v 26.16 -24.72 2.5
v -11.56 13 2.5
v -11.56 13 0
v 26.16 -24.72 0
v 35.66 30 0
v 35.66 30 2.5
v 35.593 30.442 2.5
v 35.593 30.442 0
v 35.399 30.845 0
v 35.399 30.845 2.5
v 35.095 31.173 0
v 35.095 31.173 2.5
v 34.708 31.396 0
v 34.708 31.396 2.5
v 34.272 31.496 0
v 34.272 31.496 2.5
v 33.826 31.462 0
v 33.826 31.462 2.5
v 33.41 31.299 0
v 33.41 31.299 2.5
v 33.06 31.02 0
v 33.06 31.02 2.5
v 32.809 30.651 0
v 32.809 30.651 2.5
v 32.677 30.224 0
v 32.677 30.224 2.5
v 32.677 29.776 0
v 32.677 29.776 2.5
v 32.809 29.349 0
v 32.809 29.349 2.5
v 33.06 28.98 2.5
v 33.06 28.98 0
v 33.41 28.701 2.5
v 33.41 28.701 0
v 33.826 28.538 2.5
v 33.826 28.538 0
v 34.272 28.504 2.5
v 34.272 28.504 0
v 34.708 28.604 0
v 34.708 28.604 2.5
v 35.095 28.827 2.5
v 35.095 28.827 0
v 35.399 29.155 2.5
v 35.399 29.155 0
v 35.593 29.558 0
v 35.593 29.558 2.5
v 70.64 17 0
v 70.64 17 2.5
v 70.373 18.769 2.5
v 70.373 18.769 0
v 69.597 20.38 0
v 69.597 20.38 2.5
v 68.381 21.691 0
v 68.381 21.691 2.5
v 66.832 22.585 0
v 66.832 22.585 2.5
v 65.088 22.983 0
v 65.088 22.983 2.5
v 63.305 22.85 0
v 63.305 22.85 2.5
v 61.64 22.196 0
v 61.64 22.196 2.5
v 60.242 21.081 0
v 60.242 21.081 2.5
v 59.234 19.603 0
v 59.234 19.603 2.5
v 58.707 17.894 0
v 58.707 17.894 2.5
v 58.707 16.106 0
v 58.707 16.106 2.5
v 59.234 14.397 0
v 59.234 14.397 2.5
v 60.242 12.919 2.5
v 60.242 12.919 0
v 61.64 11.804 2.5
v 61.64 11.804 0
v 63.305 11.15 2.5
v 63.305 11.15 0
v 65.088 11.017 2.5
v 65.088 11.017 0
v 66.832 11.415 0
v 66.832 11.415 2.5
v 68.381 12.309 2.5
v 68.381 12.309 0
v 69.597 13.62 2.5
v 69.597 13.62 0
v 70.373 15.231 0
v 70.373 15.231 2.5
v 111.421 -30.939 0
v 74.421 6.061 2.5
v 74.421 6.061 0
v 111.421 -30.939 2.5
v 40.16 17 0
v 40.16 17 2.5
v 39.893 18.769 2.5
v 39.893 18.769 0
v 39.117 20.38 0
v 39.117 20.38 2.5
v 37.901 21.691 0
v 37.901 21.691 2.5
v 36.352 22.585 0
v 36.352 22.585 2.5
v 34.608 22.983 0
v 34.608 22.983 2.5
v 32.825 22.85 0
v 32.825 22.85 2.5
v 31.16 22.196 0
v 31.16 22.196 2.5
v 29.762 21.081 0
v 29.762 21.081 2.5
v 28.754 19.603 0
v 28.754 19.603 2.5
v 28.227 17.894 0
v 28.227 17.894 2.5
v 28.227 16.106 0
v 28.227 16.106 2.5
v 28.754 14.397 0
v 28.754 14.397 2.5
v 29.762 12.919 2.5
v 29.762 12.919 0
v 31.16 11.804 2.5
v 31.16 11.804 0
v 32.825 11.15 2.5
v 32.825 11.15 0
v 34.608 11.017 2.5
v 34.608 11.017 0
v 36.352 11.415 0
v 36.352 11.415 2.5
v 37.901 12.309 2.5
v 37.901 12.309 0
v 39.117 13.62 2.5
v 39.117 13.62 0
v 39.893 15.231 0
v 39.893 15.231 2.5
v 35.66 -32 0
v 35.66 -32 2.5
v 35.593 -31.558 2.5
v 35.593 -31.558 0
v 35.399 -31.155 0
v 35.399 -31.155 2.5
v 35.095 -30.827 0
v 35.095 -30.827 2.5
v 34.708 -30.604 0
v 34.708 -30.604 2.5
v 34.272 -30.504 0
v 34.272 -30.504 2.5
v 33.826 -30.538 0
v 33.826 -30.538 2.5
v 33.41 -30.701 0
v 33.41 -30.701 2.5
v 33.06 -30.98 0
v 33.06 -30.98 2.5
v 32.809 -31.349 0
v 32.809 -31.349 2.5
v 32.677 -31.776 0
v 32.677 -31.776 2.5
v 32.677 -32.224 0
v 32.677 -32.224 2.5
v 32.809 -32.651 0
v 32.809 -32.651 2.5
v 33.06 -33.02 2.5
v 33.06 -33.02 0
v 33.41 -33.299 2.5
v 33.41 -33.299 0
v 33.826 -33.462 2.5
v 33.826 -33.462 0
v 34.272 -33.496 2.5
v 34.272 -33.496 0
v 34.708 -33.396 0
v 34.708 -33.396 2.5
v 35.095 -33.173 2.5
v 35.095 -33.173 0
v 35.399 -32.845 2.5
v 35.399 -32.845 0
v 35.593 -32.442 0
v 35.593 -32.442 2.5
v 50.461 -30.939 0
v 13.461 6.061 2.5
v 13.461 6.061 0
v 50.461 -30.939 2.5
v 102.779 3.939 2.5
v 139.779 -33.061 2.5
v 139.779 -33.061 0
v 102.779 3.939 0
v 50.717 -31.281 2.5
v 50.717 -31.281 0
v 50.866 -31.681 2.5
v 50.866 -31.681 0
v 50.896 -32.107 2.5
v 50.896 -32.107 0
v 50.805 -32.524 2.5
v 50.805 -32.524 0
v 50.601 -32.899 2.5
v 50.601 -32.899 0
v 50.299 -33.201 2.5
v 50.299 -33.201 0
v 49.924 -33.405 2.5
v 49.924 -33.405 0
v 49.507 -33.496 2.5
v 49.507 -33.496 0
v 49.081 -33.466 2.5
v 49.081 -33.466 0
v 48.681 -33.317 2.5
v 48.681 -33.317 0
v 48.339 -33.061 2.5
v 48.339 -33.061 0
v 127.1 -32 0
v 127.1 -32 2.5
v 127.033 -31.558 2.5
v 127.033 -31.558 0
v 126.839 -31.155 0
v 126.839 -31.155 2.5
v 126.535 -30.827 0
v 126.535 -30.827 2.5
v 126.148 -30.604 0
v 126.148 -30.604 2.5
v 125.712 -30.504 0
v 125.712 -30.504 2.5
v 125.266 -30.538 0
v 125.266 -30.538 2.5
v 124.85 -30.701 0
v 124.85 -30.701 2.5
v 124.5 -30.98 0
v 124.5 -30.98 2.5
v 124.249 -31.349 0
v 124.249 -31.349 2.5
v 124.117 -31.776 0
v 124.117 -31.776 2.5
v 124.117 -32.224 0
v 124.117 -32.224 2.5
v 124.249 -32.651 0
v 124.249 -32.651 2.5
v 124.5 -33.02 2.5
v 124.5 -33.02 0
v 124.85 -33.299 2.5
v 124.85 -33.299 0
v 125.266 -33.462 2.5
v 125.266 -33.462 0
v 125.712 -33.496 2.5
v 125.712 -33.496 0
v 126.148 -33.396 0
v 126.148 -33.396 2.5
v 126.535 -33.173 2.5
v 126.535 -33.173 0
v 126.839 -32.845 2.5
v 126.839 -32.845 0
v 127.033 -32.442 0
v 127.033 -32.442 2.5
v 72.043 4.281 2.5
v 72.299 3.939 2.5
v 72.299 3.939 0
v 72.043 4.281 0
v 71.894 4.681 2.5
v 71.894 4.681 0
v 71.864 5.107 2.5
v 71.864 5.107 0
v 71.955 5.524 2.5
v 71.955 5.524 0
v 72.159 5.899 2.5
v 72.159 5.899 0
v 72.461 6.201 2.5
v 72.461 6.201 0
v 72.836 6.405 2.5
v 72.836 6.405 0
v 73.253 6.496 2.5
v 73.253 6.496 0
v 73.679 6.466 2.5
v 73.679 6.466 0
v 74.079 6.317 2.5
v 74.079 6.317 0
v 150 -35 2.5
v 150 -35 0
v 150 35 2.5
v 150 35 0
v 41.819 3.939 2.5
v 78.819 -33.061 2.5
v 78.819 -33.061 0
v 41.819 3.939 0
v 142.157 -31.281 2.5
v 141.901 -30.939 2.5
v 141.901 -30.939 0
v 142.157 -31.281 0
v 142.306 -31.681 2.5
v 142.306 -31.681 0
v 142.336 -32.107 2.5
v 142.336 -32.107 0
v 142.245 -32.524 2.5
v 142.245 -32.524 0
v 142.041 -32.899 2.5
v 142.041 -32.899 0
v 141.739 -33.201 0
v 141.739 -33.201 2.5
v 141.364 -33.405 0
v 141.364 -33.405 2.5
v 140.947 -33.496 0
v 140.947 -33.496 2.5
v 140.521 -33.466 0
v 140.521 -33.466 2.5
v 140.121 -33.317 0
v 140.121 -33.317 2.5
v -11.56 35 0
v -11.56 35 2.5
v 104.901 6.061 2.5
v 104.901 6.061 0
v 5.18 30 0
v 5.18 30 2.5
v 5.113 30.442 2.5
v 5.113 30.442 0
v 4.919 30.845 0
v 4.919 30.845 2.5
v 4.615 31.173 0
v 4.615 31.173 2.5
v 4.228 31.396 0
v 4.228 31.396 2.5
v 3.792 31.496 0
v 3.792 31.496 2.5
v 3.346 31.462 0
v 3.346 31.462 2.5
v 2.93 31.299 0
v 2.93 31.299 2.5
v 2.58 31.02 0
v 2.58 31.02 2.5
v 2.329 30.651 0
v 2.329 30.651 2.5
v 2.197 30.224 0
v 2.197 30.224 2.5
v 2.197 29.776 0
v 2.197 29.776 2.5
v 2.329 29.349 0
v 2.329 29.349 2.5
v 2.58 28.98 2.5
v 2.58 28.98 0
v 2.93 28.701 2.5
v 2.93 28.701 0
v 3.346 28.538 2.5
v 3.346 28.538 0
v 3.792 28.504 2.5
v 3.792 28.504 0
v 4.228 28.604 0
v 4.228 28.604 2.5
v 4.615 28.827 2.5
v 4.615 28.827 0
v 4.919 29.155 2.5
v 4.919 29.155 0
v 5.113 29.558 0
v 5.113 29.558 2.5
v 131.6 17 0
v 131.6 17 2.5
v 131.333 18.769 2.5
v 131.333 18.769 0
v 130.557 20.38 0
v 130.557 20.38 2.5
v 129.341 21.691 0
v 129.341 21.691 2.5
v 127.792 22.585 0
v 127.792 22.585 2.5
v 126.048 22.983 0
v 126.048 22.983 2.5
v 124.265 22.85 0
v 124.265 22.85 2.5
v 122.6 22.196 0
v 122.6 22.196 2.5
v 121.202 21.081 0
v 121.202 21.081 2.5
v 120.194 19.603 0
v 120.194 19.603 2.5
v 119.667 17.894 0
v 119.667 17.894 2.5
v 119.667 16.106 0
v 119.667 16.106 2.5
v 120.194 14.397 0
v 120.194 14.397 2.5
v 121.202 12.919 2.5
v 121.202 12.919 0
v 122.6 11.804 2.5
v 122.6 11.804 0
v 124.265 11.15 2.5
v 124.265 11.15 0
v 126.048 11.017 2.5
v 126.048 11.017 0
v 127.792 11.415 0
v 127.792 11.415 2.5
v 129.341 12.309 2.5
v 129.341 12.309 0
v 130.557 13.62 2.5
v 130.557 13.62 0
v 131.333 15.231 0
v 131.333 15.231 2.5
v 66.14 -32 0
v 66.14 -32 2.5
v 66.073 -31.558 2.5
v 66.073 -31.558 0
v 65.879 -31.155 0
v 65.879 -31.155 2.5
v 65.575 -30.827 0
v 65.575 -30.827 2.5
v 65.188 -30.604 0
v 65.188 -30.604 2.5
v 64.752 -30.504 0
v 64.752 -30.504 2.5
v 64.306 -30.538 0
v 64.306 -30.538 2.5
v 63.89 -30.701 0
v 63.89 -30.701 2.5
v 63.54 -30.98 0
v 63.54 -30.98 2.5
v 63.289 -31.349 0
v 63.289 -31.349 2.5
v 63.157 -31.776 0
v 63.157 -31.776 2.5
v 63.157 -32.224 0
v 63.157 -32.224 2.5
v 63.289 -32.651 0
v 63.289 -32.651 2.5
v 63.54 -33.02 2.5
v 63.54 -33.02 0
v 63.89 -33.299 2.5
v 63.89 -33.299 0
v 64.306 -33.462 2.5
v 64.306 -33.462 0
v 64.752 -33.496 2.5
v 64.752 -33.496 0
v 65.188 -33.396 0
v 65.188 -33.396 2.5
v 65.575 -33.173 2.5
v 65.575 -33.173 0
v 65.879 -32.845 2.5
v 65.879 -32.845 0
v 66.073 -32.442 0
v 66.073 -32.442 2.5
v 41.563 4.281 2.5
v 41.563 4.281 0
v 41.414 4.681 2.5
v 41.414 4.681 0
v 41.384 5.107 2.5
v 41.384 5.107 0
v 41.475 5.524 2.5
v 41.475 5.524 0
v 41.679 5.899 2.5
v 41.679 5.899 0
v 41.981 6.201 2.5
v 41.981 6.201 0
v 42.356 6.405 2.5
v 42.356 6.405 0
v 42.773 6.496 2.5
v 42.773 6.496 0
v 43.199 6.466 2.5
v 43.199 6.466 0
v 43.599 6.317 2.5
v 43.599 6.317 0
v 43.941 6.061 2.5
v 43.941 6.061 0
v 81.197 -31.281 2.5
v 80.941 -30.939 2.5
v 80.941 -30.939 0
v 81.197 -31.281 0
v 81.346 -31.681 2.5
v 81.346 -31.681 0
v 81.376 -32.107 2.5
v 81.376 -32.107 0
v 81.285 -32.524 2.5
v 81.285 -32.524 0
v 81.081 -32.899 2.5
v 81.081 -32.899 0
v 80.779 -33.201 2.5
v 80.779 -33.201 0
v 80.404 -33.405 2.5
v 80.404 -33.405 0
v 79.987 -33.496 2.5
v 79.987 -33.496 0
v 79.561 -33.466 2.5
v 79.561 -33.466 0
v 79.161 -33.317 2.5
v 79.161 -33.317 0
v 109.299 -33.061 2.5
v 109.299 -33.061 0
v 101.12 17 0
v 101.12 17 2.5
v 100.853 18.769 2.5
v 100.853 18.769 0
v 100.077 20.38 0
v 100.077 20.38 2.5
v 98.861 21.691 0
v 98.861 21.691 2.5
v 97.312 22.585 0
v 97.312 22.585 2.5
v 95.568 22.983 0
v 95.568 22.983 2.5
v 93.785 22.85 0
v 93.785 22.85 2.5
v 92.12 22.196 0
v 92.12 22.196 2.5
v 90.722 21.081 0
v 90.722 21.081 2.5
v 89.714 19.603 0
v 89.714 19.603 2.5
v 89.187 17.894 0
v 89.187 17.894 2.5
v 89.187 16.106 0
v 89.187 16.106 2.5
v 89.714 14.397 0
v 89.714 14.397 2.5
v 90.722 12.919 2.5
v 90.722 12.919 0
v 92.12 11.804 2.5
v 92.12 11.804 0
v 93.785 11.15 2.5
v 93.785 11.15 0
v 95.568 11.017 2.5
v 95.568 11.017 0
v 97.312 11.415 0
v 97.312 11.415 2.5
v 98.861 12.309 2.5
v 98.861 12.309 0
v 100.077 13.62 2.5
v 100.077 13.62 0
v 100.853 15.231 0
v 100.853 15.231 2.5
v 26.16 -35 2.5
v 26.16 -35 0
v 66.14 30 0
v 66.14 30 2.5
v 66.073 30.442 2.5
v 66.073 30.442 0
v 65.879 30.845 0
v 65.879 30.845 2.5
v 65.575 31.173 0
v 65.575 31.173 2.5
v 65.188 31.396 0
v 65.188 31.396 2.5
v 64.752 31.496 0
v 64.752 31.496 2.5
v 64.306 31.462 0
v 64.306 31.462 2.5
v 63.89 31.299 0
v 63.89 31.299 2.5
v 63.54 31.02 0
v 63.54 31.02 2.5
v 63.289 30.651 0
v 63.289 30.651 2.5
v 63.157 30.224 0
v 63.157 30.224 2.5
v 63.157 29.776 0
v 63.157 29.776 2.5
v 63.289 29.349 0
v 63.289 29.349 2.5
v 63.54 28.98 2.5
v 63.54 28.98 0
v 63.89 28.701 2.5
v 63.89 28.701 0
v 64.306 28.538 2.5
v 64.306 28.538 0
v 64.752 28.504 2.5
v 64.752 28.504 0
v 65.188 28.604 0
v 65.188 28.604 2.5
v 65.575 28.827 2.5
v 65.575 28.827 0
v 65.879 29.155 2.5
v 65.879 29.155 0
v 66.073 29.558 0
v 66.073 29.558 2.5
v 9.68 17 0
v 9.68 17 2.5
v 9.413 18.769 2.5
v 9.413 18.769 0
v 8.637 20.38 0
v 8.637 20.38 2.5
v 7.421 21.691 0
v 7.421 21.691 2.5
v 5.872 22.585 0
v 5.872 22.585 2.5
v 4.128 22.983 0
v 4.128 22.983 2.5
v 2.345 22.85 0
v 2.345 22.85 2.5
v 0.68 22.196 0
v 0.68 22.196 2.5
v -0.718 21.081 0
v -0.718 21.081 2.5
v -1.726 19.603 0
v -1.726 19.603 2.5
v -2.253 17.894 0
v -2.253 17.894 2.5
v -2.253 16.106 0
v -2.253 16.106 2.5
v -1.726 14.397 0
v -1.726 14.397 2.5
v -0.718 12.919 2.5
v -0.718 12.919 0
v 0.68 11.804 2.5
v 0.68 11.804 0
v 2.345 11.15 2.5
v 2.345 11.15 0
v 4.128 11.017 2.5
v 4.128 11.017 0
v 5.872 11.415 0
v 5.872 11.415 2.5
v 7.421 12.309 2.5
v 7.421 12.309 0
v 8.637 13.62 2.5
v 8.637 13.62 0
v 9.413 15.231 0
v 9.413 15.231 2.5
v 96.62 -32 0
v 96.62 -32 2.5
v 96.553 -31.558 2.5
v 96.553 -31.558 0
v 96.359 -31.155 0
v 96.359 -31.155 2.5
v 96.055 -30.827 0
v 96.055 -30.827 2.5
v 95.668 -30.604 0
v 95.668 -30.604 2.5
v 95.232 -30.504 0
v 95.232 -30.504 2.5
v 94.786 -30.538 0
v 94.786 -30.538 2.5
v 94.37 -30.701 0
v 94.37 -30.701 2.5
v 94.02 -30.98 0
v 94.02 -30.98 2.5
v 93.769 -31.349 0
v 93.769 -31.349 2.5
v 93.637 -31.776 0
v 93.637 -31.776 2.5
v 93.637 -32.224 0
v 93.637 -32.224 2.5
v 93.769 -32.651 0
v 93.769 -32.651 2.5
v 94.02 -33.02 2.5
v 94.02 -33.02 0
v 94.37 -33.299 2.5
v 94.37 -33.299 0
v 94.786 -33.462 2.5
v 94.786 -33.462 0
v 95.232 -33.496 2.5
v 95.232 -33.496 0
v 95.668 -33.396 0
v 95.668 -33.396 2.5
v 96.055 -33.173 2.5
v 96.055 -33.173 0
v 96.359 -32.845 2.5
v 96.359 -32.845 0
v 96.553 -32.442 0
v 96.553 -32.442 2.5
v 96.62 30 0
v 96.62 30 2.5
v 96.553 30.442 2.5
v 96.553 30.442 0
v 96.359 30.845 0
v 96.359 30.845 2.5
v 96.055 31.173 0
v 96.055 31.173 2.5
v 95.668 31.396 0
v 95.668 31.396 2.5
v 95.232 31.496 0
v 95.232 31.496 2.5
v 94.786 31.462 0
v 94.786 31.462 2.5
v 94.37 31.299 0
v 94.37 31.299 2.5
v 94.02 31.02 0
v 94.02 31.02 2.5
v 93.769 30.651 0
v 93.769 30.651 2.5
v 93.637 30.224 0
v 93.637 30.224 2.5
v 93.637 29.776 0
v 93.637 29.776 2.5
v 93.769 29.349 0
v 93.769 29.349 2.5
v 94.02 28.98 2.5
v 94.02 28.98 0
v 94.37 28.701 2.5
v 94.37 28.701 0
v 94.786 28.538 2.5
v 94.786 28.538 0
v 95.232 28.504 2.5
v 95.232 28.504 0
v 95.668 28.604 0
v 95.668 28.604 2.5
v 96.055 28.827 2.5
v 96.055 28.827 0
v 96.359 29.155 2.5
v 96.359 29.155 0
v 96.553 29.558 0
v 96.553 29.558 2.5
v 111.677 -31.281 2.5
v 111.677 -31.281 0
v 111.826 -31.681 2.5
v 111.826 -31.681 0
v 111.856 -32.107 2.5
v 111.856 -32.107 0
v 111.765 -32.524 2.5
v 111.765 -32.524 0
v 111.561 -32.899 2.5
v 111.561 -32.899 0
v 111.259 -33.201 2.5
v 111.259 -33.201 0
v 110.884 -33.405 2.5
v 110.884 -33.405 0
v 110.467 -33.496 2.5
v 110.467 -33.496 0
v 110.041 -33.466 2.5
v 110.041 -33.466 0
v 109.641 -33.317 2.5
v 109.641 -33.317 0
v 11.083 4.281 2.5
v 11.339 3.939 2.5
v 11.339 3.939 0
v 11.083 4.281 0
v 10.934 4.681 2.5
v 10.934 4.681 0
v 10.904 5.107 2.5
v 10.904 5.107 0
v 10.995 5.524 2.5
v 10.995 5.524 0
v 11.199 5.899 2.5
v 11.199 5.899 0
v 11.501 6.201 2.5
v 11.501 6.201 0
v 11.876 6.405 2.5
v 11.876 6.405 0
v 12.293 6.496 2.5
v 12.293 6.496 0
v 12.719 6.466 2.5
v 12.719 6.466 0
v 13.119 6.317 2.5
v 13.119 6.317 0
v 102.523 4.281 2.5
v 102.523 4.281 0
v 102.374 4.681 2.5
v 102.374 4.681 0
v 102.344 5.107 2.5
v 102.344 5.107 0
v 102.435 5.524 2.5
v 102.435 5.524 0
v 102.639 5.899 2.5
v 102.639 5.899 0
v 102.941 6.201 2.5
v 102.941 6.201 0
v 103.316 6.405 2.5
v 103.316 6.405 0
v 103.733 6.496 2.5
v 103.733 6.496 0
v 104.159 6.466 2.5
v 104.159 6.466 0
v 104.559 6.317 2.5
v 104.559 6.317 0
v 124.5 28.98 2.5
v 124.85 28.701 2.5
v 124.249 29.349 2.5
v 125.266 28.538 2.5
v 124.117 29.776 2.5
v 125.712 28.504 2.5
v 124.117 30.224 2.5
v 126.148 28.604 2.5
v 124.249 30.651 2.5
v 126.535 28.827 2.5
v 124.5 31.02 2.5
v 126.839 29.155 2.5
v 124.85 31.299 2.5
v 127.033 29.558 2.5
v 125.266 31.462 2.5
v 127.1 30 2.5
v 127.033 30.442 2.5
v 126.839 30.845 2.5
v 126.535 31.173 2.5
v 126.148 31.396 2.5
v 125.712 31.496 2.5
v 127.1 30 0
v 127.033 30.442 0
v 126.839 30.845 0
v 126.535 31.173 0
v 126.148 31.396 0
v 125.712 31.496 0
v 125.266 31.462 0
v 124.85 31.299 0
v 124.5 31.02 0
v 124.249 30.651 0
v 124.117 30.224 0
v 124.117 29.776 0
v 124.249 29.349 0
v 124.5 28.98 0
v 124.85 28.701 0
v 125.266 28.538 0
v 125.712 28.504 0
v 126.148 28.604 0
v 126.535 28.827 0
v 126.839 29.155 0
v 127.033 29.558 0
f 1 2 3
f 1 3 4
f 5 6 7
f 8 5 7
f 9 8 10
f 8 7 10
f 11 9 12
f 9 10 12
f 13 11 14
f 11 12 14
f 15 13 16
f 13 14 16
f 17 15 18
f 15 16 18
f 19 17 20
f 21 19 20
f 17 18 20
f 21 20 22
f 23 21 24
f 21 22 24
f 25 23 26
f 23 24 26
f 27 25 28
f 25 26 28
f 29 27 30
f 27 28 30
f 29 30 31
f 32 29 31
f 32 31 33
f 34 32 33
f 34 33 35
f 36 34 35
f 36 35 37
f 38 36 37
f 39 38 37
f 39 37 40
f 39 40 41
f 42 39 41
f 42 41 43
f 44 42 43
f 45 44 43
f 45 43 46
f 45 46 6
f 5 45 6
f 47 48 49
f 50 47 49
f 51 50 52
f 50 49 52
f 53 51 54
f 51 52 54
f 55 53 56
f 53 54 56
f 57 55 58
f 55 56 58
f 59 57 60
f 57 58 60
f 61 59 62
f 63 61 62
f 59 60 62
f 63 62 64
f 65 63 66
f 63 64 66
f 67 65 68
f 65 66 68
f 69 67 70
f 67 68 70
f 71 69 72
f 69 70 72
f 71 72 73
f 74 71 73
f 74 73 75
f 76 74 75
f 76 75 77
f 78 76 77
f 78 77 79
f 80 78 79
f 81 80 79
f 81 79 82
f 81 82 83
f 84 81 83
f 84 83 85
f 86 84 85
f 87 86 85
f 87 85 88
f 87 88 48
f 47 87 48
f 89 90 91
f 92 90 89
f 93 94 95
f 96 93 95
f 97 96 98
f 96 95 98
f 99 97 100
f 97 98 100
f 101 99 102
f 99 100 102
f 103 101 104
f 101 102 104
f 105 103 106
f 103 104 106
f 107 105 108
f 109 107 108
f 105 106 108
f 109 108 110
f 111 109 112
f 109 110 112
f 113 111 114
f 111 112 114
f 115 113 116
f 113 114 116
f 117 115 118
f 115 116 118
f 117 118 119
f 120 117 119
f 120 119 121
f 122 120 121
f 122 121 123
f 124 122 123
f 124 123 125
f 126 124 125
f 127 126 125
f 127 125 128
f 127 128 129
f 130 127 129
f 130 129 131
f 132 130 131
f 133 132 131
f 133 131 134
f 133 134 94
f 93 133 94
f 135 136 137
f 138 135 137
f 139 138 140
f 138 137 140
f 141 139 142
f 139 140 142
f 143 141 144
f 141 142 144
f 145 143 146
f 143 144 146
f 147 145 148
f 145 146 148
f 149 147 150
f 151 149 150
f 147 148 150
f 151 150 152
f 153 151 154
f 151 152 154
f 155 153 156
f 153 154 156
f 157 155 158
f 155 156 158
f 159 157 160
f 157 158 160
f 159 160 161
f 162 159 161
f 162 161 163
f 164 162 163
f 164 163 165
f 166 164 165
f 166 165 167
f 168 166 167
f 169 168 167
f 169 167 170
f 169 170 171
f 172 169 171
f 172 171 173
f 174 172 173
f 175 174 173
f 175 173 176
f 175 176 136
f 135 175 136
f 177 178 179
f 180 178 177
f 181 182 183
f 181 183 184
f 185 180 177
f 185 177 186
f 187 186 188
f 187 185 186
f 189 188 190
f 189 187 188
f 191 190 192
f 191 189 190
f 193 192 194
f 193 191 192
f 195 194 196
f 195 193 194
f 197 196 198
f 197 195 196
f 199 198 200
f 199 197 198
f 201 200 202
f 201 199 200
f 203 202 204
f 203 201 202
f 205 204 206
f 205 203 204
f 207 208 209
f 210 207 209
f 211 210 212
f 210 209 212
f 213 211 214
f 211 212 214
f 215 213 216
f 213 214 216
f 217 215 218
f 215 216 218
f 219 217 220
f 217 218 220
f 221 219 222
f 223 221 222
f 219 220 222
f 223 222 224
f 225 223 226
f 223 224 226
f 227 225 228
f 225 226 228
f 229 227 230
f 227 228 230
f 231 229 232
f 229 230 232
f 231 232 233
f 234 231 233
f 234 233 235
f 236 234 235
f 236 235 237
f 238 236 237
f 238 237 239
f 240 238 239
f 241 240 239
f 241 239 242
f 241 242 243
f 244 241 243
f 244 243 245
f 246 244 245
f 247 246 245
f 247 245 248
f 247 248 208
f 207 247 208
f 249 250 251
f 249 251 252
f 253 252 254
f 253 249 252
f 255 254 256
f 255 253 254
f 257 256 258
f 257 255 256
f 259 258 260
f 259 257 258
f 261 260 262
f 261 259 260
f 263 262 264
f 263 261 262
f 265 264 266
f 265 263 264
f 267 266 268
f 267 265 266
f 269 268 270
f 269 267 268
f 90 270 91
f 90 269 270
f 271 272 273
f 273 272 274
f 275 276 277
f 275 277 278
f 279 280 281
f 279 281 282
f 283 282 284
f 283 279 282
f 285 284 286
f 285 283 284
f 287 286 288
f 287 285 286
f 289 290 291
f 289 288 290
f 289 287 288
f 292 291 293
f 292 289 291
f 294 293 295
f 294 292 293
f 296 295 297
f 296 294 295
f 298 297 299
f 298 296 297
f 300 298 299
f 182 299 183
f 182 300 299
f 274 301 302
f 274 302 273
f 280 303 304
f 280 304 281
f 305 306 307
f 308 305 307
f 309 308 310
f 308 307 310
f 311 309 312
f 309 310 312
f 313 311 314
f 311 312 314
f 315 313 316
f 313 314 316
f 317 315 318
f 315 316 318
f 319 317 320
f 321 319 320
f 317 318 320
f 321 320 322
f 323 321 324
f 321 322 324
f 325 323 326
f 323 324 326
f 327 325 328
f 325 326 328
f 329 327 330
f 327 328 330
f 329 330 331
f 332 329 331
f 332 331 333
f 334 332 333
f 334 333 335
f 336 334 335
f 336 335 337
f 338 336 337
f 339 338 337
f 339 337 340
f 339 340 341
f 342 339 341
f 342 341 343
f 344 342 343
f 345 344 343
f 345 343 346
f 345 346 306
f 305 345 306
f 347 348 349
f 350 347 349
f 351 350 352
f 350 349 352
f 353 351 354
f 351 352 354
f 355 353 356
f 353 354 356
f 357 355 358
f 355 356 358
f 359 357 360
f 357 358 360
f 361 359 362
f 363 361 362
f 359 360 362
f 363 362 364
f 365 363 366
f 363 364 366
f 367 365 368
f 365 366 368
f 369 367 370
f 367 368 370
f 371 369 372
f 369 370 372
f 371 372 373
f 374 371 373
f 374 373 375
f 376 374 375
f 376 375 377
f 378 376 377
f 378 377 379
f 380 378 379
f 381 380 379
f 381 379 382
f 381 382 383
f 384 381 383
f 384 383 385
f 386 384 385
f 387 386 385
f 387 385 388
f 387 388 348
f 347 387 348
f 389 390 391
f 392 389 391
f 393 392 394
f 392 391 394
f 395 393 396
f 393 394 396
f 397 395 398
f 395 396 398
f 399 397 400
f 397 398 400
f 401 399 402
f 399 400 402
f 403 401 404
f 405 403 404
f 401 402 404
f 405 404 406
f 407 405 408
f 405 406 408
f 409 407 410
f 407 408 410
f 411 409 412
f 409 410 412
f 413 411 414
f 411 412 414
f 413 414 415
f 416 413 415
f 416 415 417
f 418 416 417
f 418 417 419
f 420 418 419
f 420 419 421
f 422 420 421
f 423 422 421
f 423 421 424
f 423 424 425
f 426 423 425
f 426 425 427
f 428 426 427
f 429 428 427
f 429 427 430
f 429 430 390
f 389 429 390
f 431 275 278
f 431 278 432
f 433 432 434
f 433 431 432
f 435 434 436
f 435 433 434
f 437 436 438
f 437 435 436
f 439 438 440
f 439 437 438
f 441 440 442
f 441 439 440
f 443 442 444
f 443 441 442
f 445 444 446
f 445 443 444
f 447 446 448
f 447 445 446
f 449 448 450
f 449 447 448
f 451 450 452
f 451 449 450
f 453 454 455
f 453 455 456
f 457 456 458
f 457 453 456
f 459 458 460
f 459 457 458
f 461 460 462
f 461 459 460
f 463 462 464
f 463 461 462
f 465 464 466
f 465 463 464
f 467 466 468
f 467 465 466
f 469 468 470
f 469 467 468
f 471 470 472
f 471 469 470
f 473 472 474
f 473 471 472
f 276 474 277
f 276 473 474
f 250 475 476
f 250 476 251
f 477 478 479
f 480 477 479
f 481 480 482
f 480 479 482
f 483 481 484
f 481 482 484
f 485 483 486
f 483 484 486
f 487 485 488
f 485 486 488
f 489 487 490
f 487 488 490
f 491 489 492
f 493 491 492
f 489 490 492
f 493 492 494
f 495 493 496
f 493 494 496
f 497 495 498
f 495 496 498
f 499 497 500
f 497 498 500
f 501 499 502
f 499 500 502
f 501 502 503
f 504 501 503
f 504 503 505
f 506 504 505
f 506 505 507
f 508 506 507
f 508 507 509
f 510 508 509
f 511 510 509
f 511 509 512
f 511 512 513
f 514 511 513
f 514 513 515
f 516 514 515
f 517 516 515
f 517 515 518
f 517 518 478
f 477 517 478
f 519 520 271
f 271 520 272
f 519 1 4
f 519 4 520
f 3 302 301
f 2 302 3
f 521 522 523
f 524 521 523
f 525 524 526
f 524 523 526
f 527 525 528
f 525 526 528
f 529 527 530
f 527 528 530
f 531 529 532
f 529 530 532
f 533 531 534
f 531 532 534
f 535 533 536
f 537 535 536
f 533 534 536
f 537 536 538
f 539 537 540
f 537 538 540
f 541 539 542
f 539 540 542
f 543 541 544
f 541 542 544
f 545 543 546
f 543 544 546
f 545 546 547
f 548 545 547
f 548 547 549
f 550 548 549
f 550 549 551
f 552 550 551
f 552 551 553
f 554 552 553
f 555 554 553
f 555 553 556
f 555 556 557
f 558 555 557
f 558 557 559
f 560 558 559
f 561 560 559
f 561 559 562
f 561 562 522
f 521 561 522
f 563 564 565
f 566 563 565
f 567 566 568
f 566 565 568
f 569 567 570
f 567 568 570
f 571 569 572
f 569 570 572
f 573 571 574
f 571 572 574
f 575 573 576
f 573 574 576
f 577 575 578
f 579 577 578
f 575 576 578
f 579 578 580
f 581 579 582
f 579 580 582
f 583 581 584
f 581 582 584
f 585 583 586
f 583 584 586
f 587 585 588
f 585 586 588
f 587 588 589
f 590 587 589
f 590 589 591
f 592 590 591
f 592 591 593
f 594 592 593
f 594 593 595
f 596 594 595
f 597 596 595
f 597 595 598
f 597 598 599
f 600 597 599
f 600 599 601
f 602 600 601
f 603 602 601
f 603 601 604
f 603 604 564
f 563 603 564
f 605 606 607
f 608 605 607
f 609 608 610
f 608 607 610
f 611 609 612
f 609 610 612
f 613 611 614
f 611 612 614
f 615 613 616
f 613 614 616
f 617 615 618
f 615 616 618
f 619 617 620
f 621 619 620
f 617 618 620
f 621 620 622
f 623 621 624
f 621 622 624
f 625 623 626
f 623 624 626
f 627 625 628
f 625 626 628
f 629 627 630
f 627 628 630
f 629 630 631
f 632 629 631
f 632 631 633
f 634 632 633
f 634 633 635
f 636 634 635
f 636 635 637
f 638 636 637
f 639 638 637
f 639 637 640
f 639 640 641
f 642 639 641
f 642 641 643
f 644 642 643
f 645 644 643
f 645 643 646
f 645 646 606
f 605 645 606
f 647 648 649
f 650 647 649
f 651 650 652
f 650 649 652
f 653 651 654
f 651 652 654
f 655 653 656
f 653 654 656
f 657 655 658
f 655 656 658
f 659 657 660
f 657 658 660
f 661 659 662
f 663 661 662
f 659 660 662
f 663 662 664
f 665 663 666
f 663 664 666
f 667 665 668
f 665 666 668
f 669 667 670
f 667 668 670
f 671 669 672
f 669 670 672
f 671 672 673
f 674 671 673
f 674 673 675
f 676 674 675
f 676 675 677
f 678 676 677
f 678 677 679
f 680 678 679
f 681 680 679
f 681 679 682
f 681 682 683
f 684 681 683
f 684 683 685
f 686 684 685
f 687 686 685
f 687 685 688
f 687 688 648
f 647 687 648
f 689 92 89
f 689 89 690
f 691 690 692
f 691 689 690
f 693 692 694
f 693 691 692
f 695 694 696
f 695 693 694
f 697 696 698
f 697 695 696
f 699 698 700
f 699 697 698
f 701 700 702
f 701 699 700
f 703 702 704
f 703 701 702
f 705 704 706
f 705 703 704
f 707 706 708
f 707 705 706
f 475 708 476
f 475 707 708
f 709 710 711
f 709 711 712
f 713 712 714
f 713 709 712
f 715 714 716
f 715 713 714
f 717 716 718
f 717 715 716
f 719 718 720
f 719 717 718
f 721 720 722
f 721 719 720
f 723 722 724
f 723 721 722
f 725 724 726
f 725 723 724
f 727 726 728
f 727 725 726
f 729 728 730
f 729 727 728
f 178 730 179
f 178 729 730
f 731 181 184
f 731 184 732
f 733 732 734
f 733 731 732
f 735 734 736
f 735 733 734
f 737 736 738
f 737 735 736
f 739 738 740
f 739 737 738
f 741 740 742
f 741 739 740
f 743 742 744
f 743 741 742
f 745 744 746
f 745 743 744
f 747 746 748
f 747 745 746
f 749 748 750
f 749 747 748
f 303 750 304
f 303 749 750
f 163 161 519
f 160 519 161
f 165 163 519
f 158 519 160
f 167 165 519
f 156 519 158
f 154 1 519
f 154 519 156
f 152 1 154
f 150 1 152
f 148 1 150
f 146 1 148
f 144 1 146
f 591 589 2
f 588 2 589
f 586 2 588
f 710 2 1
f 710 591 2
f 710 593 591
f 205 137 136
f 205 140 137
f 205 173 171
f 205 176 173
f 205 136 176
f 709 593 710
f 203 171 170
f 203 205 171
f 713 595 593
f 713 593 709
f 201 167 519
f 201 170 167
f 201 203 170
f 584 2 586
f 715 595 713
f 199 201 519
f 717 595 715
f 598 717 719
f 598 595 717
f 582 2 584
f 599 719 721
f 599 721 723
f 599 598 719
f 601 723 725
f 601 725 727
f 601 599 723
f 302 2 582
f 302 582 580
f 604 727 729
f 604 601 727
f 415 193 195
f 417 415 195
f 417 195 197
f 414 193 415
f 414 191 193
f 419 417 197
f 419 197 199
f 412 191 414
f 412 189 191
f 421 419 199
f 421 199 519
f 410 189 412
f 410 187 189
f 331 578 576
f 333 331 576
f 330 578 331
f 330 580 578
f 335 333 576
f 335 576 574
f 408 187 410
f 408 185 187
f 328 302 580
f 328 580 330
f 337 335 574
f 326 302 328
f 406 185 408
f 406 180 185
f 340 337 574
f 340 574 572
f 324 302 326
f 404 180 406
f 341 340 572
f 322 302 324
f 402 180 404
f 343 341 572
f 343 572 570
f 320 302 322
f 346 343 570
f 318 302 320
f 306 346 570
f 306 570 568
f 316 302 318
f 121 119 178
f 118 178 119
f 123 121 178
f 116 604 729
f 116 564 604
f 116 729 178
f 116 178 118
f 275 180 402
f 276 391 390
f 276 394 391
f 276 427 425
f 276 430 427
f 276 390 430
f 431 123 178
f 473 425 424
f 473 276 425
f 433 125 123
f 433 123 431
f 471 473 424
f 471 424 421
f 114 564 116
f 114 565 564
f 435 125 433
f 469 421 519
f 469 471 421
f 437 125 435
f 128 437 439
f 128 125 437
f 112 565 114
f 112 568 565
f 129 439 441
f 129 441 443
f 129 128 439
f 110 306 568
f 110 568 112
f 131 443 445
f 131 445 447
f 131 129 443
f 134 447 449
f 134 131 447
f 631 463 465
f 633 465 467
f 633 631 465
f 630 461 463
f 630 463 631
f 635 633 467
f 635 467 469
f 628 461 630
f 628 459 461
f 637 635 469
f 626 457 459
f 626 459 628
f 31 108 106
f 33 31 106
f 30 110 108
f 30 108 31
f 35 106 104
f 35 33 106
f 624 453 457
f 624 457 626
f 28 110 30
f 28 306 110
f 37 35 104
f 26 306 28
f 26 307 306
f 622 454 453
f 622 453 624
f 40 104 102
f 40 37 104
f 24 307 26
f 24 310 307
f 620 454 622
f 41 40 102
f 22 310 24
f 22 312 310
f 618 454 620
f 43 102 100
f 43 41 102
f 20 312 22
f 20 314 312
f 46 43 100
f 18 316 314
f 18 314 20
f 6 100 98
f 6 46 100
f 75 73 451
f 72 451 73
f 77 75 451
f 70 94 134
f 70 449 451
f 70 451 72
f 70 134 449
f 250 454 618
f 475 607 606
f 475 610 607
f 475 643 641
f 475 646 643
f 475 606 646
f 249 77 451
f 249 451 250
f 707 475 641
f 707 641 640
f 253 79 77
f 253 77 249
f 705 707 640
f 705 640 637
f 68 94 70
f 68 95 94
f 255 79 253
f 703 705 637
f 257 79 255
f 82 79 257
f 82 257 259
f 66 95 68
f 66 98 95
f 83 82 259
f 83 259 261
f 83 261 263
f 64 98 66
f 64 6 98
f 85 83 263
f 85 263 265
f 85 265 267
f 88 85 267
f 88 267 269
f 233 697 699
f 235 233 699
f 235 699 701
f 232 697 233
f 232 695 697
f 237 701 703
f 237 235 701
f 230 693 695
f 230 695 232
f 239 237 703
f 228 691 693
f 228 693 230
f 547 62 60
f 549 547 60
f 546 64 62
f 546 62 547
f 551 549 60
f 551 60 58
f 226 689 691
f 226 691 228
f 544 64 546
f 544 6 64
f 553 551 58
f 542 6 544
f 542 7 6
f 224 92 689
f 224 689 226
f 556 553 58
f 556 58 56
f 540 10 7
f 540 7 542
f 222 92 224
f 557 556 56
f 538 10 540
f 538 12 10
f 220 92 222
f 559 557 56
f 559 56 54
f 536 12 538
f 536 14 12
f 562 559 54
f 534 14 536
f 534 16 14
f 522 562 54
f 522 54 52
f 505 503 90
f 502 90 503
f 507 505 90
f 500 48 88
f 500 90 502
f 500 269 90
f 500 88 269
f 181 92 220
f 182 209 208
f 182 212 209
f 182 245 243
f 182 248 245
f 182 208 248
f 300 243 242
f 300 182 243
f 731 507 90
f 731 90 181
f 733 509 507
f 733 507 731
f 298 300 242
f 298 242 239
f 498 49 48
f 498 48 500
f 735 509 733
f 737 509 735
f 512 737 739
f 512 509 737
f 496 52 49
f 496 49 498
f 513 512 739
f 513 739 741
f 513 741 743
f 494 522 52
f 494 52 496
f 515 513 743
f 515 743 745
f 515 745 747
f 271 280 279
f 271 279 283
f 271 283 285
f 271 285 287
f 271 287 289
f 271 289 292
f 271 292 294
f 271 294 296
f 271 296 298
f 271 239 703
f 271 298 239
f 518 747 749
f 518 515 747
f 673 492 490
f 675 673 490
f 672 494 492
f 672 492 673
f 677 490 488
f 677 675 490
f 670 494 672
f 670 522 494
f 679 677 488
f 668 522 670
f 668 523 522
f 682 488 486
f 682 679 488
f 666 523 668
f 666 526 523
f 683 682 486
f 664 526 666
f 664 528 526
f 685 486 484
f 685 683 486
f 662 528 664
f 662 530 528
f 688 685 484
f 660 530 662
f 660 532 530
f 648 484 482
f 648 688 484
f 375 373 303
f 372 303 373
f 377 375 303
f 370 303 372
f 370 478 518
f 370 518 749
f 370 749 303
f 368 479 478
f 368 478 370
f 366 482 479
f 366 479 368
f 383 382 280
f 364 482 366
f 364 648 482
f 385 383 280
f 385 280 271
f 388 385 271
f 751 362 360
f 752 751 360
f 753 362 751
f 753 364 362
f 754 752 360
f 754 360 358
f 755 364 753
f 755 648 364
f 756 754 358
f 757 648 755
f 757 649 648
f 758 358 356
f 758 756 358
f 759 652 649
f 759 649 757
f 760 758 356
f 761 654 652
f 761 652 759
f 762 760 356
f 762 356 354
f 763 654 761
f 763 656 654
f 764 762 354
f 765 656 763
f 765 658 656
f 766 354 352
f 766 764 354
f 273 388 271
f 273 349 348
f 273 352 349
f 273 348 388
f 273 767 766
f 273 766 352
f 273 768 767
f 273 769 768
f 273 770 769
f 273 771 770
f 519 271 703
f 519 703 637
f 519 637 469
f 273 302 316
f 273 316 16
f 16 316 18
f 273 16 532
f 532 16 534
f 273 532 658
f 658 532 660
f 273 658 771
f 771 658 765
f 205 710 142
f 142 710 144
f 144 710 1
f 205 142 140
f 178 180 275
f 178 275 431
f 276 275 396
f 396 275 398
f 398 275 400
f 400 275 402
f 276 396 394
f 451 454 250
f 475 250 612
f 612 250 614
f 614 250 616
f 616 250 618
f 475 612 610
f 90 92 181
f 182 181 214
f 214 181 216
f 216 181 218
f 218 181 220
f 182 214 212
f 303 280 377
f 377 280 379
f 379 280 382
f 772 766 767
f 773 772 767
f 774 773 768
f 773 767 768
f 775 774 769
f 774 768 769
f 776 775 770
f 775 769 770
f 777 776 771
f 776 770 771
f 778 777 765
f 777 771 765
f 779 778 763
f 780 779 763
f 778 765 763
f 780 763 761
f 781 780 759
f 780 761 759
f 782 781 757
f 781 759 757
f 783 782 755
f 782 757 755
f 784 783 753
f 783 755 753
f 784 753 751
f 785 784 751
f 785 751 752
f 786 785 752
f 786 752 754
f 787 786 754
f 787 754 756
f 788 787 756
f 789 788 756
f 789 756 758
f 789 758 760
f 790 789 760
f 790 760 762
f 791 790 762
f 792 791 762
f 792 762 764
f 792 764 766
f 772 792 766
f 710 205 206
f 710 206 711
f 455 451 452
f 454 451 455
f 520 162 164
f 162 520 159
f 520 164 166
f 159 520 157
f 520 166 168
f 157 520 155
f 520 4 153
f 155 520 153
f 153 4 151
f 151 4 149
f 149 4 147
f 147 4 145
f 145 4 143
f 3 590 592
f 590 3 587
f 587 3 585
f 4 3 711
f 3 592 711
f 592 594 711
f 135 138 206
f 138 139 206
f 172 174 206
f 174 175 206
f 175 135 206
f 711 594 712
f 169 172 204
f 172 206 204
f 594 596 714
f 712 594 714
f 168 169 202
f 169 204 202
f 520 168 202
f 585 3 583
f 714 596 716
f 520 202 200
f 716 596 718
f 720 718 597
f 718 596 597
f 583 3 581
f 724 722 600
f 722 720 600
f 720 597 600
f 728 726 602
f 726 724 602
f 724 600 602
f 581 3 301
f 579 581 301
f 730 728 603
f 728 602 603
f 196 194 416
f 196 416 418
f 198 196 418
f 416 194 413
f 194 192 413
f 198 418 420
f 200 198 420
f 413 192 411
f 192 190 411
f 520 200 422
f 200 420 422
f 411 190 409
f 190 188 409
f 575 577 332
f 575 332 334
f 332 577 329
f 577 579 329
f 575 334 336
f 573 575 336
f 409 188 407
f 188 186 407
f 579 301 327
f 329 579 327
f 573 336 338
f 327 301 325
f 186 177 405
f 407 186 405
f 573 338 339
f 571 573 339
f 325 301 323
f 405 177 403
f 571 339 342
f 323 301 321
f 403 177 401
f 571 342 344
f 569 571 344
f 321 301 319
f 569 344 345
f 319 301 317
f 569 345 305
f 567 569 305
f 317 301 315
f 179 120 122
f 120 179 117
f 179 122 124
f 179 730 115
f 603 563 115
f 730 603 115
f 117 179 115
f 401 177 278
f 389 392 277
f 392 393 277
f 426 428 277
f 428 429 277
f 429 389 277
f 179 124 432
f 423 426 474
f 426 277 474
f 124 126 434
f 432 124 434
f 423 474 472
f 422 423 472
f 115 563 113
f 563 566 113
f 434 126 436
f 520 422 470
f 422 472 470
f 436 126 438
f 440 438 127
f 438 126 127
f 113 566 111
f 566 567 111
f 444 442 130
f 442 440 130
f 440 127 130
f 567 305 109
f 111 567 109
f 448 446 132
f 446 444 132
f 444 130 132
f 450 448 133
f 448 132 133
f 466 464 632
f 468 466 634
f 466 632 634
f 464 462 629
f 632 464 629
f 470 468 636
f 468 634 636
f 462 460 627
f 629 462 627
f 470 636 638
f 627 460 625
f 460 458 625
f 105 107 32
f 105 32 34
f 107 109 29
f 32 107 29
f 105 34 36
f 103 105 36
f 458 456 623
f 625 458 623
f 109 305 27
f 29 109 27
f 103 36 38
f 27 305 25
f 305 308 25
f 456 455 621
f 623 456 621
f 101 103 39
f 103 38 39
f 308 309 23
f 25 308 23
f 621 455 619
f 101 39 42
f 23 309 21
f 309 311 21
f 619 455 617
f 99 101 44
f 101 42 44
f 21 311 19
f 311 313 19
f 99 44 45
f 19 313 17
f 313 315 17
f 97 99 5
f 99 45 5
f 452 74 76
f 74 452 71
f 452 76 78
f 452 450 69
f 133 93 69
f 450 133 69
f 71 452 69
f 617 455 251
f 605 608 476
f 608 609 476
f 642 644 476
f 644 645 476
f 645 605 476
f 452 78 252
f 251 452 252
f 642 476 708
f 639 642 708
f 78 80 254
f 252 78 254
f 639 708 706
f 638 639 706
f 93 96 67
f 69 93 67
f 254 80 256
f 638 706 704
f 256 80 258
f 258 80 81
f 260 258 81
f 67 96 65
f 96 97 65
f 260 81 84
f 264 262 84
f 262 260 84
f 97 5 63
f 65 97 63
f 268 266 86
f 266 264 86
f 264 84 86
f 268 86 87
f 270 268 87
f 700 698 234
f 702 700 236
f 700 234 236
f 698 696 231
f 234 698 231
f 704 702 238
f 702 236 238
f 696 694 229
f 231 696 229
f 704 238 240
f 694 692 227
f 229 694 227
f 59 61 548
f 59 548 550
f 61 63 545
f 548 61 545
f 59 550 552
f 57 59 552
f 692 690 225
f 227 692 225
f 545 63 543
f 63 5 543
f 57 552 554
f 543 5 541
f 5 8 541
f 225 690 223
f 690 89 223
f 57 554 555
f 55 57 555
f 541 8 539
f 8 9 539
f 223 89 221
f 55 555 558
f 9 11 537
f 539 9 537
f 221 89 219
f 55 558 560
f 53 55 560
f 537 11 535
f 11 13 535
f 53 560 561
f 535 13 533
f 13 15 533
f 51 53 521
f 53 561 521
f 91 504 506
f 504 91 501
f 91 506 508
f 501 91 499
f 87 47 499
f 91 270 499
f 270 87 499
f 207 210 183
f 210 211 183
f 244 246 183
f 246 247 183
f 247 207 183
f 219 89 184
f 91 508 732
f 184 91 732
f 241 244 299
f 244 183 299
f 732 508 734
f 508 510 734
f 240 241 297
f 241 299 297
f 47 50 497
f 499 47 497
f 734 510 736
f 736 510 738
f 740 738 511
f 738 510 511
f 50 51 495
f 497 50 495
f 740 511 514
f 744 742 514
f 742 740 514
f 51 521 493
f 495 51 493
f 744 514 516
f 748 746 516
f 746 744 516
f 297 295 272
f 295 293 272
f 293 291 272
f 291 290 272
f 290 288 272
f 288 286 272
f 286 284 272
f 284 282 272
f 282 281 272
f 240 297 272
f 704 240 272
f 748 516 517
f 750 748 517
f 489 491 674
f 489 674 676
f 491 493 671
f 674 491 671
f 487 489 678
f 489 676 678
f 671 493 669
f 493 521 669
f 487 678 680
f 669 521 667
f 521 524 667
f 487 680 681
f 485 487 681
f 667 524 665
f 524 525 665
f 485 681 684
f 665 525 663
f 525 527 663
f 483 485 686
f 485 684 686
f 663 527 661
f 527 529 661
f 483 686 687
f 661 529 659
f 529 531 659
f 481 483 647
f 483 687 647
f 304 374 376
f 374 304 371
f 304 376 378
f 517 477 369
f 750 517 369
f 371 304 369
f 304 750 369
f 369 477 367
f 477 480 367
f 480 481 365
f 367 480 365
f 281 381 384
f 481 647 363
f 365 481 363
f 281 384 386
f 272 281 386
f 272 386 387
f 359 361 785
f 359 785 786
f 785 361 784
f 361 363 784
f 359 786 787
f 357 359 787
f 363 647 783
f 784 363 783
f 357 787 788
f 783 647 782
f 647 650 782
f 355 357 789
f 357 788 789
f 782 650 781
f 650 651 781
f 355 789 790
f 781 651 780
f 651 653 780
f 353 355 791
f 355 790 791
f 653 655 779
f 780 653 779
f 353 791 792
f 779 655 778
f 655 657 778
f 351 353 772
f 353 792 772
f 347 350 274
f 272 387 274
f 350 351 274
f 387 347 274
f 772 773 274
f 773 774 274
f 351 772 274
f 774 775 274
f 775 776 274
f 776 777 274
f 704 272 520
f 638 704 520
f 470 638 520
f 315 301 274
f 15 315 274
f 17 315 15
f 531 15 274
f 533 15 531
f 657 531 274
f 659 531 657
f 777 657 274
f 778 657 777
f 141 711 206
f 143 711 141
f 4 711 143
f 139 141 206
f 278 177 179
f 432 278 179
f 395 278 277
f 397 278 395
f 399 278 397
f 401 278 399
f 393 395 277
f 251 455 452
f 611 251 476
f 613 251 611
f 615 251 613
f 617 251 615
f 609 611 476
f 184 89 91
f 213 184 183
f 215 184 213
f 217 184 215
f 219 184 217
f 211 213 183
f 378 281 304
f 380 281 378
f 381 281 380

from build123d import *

# Parameters (mm, degrees)
SKETCH_1_W             = 300
SKETCH_1_H             = 70
EXTRUDE_1_DEPTH        = 2.5
SKETCH_2_R             = 1.5
SKETCH_2_R_2           = 6
CUT_EXTRUDE_1_DEPTH    = 155.04950503
PATTERN_LINEAR_1_COUNT = 9
PATTERN_LINEAR_1_PITCH = 30.48
CUT_EXTRUDE_2_DEPTH    = 10


with BuildPart() as part:
    # 草图1 → 凸台-拉伸1 (new body)
    with BuildSketch(Plane.XY):
        Rectangle(SKETCH_1_W, SKETCH_1_H)
    extrude(amount=EXTRUDE_1_DEPTH)

    # 草图2 → 切除-拉伸1 (cut, through all)
    with BuildSketch(Plane.XY.offset(2.5)):
        with Locations((-118.24, -32)):
            Circle(SKETCH_2_R)
        with Locations((-118.24, 30)):
            Circle(SKETCH_2_R)
        with Locations((-118.24, 17)):
            Circle(SKETCH_2_R_2)
        with BuildLine():
            Line((-104.060660172, -33.060660172), (-141.060660172, 3.939339828))
            ThreePointArc((-141.060660172, 3.939339828), (-141.060660172, 6.060660172), (-138.939339828, 6.060660172))
            Line((-138.939339828, 6.060660172), (-101.939339828, -30.939339828))
            ThreePointArc((-101.939339828, -30.939339828), (-101.939339828, -33.060660172), (-104.060660172, -33.060660172))
        make_face()
    cut_extrude_1 = extrude(amount=-CUT_EXTRUDE_1_DEPTH, mode=Mode.SUBTRACT)

    # 阵列(线性)1: 切除-拉伸1 ×9
    with Locations(*[(i * PATTERN_LINEAR_1_PITCH, 0, 0) for i in range(1, PATTERN_LINEAR_1_COUNT)]):
        add(cut_extrude_1, mode=Mode.SUBTRACT)

    # 草图3 → 切除-拉伸2 (cut)
    with BuildSketch(Plane.XY.offset(2.5)):
        Polygon((-11.56, 35), (-11.56, 13), (26.16, -24.72), (26.16, -35), (-150, -35), (-150, 35), align=None)
    extrude(amount=-CUT_EXTRUDE_2_DEPTH, mode=Mode.SUBTRACT)


solid = part.part
